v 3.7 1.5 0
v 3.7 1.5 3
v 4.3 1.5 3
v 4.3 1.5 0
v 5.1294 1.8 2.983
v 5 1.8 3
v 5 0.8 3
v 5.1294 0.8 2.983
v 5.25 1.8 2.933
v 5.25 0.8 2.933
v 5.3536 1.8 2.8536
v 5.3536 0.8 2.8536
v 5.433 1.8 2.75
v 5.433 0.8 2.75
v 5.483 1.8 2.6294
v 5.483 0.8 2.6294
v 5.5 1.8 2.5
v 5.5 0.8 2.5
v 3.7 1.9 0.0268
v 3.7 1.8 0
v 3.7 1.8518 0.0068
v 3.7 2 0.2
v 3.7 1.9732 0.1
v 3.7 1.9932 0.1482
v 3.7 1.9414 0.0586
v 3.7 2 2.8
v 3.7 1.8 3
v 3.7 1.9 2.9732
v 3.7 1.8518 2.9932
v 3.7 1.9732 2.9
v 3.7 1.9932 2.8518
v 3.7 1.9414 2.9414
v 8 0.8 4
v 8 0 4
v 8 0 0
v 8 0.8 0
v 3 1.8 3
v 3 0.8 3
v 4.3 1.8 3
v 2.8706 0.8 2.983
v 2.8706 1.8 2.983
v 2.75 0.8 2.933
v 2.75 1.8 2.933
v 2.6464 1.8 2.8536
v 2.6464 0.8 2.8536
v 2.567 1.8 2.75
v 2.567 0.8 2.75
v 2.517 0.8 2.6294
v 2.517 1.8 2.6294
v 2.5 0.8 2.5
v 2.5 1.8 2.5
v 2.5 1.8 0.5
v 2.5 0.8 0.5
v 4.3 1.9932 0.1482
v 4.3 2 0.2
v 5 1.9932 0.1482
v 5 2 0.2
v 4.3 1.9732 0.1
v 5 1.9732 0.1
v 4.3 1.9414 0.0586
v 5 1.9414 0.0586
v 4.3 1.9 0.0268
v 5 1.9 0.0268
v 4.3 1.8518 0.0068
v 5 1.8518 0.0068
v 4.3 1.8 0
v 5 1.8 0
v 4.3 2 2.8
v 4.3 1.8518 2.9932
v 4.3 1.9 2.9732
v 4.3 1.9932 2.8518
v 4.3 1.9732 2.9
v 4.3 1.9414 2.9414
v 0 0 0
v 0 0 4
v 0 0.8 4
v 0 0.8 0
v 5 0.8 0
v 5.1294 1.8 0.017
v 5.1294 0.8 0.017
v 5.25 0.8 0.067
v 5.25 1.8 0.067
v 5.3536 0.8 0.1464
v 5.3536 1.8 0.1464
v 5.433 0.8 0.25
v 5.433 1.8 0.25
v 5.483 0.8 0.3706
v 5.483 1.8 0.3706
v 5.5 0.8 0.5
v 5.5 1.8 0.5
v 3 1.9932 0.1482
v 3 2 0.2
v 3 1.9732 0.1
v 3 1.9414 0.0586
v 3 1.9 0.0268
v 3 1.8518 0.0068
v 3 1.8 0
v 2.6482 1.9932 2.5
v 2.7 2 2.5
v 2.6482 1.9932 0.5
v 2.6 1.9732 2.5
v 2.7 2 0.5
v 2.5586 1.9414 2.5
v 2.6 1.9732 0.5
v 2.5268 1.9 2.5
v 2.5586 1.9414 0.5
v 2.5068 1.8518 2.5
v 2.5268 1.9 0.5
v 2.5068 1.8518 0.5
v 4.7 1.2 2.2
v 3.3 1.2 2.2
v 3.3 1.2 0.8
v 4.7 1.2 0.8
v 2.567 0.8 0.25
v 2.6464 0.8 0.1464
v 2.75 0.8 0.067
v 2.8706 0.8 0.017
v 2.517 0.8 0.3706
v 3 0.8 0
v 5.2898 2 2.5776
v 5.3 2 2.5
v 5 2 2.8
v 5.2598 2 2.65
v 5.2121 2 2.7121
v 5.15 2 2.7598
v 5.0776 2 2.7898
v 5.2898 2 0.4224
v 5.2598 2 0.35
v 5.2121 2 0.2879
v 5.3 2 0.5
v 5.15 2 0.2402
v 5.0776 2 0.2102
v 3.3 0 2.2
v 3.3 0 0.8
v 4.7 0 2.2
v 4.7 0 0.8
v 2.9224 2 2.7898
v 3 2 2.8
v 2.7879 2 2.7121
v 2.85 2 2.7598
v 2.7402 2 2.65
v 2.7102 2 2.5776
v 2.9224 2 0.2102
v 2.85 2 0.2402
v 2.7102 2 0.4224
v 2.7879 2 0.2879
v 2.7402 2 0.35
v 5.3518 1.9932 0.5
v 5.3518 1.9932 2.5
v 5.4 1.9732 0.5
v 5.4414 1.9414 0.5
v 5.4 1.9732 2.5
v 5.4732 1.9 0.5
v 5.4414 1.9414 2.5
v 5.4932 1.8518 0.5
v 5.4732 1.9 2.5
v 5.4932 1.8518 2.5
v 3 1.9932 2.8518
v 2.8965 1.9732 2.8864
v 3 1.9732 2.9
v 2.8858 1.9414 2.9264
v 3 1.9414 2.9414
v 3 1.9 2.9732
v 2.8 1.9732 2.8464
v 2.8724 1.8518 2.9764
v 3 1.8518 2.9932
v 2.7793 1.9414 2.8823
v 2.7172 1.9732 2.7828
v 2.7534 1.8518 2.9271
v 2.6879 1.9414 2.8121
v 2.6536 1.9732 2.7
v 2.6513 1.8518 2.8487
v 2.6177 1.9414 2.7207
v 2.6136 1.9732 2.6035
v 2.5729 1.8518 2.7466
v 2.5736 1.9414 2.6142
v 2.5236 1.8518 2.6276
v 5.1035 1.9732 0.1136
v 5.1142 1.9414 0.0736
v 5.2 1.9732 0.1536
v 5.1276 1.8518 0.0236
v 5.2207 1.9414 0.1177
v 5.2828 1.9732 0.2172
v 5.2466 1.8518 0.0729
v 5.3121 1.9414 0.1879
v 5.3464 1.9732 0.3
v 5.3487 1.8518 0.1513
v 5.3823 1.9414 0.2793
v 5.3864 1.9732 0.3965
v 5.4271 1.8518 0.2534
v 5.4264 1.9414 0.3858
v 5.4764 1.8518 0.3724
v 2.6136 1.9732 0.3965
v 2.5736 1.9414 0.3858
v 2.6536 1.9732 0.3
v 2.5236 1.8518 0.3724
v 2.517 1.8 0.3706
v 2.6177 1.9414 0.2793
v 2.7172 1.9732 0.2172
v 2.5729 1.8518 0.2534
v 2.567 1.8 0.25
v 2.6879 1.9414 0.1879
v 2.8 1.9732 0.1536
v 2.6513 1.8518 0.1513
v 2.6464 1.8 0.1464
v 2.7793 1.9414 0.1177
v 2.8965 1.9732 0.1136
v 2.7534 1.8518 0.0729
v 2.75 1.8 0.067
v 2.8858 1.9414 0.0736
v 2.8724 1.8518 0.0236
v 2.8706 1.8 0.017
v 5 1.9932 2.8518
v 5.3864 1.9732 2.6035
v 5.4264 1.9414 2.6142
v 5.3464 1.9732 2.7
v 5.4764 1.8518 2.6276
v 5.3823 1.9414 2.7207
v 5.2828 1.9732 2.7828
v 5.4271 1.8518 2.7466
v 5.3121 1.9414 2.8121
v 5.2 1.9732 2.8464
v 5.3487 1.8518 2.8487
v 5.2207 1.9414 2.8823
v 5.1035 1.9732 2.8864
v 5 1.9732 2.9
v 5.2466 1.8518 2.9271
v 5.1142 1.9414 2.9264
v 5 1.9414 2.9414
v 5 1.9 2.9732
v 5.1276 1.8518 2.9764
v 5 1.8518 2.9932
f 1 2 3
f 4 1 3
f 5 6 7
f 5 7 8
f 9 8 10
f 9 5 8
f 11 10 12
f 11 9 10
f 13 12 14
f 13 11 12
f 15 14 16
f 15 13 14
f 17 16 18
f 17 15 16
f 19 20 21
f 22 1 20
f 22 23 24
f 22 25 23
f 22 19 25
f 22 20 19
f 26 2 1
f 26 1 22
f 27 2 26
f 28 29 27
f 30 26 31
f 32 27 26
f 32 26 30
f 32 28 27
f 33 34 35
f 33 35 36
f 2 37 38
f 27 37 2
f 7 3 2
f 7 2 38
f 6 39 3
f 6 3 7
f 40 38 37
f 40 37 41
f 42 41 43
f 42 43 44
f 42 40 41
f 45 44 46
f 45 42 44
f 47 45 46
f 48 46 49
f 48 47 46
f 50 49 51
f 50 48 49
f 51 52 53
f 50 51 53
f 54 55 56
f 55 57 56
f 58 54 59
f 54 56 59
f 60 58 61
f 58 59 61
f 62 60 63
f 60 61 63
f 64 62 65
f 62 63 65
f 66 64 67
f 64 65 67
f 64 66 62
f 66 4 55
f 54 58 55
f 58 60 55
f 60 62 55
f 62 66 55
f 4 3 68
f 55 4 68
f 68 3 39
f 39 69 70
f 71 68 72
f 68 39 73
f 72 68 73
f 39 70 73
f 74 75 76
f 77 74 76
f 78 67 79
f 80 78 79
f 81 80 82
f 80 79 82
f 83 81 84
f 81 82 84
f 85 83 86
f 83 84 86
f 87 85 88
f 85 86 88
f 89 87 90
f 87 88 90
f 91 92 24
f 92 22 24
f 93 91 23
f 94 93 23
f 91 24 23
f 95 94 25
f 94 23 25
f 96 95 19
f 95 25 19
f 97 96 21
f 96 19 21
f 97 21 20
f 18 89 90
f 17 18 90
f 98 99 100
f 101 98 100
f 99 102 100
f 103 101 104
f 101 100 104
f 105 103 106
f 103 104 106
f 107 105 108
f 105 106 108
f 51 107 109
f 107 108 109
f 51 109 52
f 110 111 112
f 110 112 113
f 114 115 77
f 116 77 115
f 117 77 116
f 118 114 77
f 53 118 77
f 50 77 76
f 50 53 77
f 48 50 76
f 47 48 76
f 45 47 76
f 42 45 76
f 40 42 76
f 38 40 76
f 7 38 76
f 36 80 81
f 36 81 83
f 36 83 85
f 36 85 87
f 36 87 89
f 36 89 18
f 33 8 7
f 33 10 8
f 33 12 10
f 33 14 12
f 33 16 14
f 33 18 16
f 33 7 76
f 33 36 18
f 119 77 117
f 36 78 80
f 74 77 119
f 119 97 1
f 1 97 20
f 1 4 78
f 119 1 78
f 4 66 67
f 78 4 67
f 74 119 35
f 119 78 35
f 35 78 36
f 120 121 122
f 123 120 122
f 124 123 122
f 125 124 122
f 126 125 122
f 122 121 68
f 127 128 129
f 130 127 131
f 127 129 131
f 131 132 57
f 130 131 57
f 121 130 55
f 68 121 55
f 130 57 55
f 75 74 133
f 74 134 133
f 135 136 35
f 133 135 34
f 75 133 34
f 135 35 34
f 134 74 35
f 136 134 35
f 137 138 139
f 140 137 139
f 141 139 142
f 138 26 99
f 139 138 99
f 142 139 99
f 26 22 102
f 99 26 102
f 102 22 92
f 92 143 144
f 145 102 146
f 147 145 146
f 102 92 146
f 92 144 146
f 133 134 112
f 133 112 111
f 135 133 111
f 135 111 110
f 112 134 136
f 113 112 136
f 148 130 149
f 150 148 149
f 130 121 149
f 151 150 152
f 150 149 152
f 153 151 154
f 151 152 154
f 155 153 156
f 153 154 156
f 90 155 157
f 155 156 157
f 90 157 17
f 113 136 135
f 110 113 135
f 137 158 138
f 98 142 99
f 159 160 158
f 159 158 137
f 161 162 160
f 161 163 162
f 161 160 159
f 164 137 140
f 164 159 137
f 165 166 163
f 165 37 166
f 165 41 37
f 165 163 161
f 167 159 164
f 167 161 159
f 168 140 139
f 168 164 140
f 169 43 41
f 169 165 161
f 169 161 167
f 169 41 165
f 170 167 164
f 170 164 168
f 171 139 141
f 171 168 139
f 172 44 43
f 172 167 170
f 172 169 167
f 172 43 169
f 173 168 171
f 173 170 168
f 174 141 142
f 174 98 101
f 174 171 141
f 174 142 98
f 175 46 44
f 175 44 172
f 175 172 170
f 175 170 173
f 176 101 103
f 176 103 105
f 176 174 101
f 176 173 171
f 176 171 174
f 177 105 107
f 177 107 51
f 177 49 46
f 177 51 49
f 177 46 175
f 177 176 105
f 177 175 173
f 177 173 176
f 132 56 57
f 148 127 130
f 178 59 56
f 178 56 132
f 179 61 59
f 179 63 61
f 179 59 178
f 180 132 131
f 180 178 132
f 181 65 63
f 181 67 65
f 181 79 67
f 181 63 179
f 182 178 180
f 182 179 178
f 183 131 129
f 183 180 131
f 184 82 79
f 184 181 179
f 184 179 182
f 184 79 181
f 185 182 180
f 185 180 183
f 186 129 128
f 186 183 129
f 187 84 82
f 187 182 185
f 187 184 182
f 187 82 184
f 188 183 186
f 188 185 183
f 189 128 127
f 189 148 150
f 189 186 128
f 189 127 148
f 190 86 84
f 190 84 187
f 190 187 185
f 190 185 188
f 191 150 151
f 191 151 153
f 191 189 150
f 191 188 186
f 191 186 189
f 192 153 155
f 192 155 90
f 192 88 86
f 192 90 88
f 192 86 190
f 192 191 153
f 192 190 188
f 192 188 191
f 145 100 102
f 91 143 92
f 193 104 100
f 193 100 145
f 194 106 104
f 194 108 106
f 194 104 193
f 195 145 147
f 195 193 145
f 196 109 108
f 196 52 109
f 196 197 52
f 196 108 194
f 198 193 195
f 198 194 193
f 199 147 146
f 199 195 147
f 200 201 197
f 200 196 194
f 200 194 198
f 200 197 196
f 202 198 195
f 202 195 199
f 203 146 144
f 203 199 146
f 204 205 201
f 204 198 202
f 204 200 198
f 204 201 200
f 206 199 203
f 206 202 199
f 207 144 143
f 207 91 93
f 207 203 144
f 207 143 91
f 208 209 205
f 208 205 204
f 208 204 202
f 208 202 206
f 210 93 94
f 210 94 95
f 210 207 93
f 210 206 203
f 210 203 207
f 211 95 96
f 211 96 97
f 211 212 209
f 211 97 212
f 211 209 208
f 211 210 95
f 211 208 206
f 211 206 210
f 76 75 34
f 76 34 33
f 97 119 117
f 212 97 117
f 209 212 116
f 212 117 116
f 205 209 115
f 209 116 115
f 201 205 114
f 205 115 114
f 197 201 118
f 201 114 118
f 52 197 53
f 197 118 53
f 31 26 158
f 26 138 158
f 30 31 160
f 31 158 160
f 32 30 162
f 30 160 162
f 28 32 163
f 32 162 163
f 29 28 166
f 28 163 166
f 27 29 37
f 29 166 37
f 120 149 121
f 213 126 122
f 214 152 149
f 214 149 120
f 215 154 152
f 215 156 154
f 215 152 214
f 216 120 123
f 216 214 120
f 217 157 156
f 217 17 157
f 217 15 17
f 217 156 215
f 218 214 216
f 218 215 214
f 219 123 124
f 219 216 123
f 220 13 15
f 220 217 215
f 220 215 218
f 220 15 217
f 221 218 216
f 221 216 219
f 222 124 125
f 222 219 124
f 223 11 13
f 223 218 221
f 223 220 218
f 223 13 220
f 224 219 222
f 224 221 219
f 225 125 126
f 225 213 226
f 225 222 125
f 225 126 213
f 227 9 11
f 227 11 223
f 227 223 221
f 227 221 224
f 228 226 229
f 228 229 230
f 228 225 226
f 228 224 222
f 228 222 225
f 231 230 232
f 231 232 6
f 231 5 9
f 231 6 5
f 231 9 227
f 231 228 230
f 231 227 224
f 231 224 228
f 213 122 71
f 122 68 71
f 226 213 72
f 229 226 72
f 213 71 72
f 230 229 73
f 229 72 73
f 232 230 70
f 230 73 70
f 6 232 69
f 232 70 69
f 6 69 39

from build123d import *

# Parameters (mm, degrees)
F1_DEPTH = 3
F2_W     = 1.4
F2_H     = 1.4
F3_DEPTH = 1.2
F4_R     = 0.5
F5_W     = 0.8
F5_H     = 1
F6_DEPTH = 8
F7_W     = 0.5999999121
F7_H     = 0.5
F8_DEPTH = 3
F9_R     = 0.2


with BuildPart() as f1:
    # F0 (on Top) → F1 (new body)
    with BuildSketch(Plane.XY):
        Polygon((0, 0.8), (0, 0), (8, 0), (8, 0.8), (5.5, 0.8), (5.5, 2), (2.5, 2), (2.5, 0.8), align=None)
    extrude(amount=F1_DEPTH)

    # F2 (on face) → F3 (cut)
    with BuildSketch(Plane.XZ):
        with Locations((4, 1.5)):
            Rectangle(F2_W, F2_H)
    extrude(amount=-F3_DEPTH, mode=Mode.SUBTRACT)

    # F4
    f4_edges = [f1.edges().sort_by_distance(p)[0] for p in [
        (5.5, 1.4, 3),
        (2.5, 1.4, 3),
        (2.5, 1.4, 0),
        (5.5, 1.4, 0),
    ]]
    fillet(f4_edges, radius=F4_R)

    # F5 (on face) → F6 (join, through all)
    with BuildSketch(Plane.YZ.offset(8)):
        with Locations((0.4, 3.5)):
            Rectangle(F5_W, F5_H)
    extrude(amount=-F6_DEPTH)

    # F7 (on face) → F8 (cut, through all)
    with BuildSketch(Plane.XY.offset(3)):
        with Locations((4, 1.75)):
            Rectangle(F7_W, F7_H)
    extrude(amount=-F8_DEPTH, mode=Mode.SUBTRACT)

    # F9
    f9_edges = [f1.edges().sort_by_distance(p)[0] for p in [
        (3.35, 2, 3),
        (4.65, 2, 3),
        (5.353553, 2, 2.853553),
        (5.5, 2, 1.5),
        (5.353553, 2, 0.146447),
        (3.35, 2, 0),
        (4.65, 2, 0),
        (2.646447, 2, 0.146447),
        (2.5, 2, 1.5),
        (2.646447, 2, 2.853553),
    ]]
    fillet(f9_edges, radius=F9_R)


solid = f1.part
